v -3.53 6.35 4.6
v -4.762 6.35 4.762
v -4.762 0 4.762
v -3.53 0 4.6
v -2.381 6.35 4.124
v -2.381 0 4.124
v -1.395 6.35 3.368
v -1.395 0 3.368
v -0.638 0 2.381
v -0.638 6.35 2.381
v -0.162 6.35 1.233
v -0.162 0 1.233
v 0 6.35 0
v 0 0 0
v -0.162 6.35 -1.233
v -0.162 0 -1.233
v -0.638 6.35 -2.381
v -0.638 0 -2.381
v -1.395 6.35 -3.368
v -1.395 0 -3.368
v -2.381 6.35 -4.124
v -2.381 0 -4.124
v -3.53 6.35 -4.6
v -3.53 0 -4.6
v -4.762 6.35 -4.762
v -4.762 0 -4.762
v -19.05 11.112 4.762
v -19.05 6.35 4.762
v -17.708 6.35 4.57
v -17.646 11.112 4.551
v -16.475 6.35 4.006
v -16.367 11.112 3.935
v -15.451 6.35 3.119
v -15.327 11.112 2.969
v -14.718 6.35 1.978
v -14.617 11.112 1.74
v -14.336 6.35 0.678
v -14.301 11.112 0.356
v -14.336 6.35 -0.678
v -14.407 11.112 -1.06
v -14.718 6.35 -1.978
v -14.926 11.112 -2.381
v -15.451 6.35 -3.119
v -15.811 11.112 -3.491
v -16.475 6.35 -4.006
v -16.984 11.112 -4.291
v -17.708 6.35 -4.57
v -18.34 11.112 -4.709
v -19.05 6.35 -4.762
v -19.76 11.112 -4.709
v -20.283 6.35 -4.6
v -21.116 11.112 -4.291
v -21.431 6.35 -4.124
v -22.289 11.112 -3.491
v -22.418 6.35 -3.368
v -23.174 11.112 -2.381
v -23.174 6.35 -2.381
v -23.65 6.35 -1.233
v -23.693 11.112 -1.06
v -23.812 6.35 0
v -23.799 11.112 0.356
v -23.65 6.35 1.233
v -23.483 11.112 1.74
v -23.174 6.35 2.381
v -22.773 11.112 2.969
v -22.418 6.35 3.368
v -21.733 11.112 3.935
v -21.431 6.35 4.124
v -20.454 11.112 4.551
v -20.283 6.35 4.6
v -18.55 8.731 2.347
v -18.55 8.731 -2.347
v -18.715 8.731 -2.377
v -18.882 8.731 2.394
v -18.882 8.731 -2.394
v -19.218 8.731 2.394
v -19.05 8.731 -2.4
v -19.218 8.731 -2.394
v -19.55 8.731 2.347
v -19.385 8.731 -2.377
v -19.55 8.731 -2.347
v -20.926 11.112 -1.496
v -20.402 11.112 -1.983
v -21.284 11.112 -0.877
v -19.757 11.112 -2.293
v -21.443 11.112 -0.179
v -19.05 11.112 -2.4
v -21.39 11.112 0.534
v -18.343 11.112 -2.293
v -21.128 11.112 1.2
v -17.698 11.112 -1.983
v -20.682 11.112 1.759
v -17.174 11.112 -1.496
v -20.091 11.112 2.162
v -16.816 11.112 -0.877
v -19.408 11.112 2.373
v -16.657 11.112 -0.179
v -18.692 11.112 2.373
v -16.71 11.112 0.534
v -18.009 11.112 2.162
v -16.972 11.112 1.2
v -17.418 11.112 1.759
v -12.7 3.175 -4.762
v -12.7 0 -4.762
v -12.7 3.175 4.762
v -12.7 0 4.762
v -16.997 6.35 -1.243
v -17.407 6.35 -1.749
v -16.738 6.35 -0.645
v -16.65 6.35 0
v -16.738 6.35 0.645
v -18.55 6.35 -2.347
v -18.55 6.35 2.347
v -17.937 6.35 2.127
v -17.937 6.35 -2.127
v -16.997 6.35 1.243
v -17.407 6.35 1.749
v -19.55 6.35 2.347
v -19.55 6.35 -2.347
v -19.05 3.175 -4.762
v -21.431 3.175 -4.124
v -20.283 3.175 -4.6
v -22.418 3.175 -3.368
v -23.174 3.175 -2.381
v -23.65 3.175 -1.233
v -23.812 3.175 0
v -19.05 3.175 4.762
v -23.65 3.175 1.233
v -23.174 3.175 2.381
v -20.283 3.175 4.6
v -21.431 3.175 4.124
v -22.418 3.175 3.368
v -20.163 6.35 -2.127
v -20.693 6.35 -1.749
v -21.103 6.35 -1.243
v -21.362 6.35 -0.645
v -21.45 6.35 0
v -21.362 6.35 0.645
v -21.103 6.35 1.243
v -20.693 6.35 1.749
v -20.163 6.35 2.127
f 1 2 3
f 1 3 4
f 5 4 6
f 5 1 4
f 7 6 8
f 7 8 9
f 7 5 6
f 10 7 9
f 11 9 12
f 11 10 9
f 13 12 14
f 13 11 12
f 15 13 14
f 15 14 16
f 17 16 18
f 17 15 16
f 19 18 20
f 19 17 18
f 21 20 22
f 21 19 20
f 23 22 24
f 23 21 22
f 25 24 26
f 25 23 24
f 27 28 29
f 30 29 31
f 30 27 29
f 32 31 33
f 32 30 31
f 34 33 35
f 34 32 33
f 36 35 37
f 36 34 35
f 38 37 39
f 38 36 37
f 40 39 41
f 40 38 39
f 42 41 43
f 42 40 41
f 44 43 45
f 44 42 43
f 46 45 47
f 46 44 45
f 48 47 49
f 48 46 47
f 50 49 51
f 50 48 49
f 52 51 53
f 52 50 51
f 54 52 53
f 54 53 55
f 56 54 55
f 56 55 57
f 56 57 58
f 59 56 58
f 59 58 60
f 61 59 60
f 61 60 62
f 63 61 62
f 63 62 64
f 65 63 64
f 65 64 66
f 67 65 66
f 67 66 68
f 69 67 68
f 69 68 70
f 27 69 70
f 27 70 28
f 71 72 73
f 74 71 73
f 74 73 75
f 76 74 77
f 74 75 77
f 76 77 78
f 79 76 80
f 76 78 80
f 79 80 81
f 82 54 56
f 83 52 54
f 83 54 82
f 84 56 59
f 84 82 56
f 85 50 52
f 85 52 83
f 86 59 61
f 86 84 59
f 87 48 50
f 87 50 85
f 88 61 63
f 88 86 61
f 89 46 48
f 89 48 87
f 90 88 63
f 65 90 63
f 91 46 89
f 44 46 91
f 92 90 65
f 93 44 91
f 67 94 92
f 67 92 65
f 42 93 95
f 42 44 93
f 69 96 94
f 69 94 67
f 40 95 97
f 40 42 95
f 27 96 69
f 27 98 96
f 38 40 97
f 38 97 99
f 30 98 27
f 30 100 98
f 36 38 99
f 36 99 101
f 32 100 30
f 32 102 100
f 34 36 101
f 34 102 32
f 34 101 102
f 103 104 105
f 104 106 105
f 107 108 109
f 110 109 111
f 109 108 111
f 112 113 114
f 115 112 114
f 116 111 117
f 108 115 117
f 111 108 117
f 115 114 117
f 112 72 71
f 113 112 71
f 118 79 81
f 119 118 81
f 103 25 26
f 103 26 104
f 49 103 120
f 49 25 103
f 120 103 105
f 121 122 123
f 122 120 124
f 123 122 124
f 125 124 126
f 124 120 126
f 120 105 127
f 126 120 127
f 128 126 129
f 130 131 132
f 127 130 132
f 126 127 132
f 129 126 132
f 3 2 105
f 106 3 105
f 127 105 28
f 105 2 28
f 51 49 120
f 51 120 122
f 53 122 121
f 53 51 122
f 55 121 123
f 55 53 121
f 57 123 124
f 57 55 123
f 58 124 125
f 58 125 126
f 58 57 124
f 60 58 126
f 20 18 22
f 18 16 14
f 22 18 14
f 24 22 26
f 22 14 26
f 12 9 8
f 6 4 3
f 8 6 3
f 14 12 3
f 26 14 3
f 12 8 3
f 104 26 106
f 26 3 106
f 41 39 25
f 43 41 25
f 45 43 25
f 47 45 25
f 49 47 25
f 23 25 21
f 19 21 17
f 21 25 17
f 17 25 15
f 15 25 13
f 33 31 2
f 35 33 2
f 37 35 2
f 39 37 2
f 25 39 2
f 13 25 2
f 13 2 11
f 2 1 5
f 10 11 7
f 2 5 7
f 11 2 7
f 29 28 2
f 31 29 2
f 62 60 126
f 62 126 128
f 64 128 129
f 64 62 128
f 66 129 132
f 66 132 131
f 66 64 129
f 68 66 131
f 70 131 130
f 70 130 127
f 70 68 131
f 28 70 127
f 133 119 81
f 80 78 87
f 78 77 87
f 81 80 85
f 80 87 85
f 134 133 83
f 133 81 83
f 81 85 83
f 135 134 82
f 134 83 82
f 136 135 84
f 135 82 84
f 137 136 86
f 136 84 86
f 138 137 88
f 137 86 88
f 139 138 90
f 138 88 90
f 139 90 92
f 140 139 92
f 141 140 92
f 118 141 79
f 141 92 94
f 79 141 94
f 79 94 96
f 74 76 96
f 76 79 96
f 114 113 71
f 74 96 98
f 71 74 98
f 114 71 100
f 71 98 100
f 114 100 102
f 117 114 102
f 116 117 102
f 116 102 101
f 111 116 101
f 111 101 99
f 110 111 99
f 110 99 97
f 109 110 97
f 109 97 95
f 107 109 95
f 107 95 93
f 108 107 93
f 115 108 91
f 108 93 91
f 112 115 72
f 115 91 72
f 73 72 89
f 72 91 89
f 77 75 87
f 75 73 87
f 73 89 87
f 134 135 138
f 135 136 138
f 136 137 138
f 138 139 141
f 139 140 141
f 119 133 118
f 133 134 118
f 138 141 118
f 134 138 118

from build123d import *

# Parameters (mm, degrees)
BOSS_EXTRUDE1_DEPTH = 4.7625
CUT_EXTRUDE2_REACH  = 27.101
SKETCH5_R           = 4.7625
SKETCH5_R_2         = 2.4
BOSS_EXTRUDE2_DEPTH = 4.7625
BOSS_EXTRUDE3_DEPTH = 2.38125


with BuildPart() as part:
    # Sketch1 → Boss-Extrude1 (new, symmetric)
    with BuildSketch(Plane.XY):
        Polygon((0, 0), (-12.7, 0), (-12.7, 3.175), (-23.8125, 3.175), (-23.8125, 6.35), (0, 6.35), align=None)
    extrude(amount=BOSS_EXTRUDE1_DEPTH, both=True)

    # Sketch3 → Cut-Extrude2 (cut, up to next)
    with BuildSketch(Plane.XZ, mode=Mode.PRIVATE) as cut_extrude2_sk1:
        with BuildLine():
            ThreePointArc((-19.05, -4.7625), (-22.417596045, -3.367596045), (-23.8125, 0))
            Line((-23.8125, 0), (-23.8125, -4.7625))
            Line((-23.8125, -4.7625), (-19.05, -4.7625))
        make_face()
    cut_extrude2_tool1 = extrude(cut_extrude2_sk1.sketch, amount=-CUT_EXTRUDE2_REACH, mode=Mode.PRIVATE) & part.part
    # Sketch3 → Cut-Extrude2 (cut, up to next)
    with BuildSketch(Plane.XZ, mode=Mode.PRIVATE) as cut_extrude2_sk2:
        with BuildLine():
            Line((-23.8125, 4.7625), (-23.8125, 0))
            ThreePointArc((-23.8125, 0), (-22.417596045, 3.367596045), (-19.05, 4.7625))
            Line((-19.05, 4.7625), (-23.8125, 4.7625))
        make_face()
    cut_extrude2_tool2 = extrude(cut_extrude2_sk2.sketch, amount=-CUT_EXTRUDE2_REACH, mode=Mode.PRIVATE) & part.part
    # Sketch3 → Cut-Extrude2 (cut, up to next)
    with BuildSketch(Plane.XZ, mode=Mode.PRIVATE) as cut_extrude2_sk3:
        with BuildLine():
            Line((0, -4.7625), (0, 0))
            ThreePointArc((0, 0), (-1.394903955, -3.367596045), (-4.7625, -4.7625))
            Line((-4.7625, -4.7625), (0, -4.7625))
        make_face()
    cut_extrude2_tool3 = extrude(cut_extrude2_sk3.sketch, amount=-CUT_EXTRUDE2_REACH, mode=Mode.PRIVATE) & part.part
    # Sketch3 → Cut-Extrude2 (cut, up to next)
    with BuildSketch(Plane.XZ, mode=Mode.PRIVATE) as cut_extrude2_sk4:
        with BuildLine():
            Line((0, 4.7625), (-4.7625, 4.7625))
            ThreePointArc((-4.7625, 4.7625), (-1.394903955, 3.367596045), (0, 0))
            Line((0, 0), (0, 4.7625))
        make_face()
    cut_extrude2_tool4 = extrude(cut_extrude2_sk4.sketch, amount=-CUT_EXTRUDE2_REACH, mode=Mode.PRIVATE) & part.part
    add(cut_extrude2_tool1.solids().sort_by_distance((-22.74871, 0, -3.69871))[0], mode=Mode.SUBTRACT)
    add(cut_extrude2_tool2.solids().sort_by_distance((-22.74871, 0, 3.69871))[0], mode=Mode.SUBTRACT)
    add(cut_extrude2_tool3.solids().sort_by_distance((-1.06379, 0, -3.69871))[0], mode=Mode.SUBTRACT)
    add(cut_extrude2_tool4.solids().sort_by_distance((-1.06379, 0, 3.69871))[0], mode=Mode.SUBTRACT)

    # Sketch5 → Boss-Extrude2 (add)
    with BuildSketch(Plane(origin=(0, 6.35, 0), x_dir=(1, 0, 0), z_dir=(0, 1, 0))):
        with Locations((-19.05, 0)):
            Circle(SKETCH5_R)
        with Locations((-19.05, 0)):
            Circle(SKETCH5_R_2, mode=Mode.SUBTRACT)
    extrude(amount=BOSS_EXTRUDE2_DEPTH)

    # Sketch6 → Boss-Extrude3 (add)
    with BuildSketch(Plane(origin=(0, 6.35, 0), x_dir=(1, 0, 0), z_dir=(0, 1, 0))):
        with BuildLine():
            Line((-19.55, -2.347338919), (-19.55, 2.347338919))
            ThreePointArc((-19.55, 2.347338919), (-19.05, 2.4), (-18.55, 2.347338919))
            Line((-18.55, 2.347338919), (-18.55, -2.347338919))
            ThreePointArc((-18.55, -2.347338919), (-19.05, -2.4), (-19.55, -2.347338919))
        make_face()
    extrude(amount=BOSS_EXTRUDE3_DEPTH)


solid = part.part
